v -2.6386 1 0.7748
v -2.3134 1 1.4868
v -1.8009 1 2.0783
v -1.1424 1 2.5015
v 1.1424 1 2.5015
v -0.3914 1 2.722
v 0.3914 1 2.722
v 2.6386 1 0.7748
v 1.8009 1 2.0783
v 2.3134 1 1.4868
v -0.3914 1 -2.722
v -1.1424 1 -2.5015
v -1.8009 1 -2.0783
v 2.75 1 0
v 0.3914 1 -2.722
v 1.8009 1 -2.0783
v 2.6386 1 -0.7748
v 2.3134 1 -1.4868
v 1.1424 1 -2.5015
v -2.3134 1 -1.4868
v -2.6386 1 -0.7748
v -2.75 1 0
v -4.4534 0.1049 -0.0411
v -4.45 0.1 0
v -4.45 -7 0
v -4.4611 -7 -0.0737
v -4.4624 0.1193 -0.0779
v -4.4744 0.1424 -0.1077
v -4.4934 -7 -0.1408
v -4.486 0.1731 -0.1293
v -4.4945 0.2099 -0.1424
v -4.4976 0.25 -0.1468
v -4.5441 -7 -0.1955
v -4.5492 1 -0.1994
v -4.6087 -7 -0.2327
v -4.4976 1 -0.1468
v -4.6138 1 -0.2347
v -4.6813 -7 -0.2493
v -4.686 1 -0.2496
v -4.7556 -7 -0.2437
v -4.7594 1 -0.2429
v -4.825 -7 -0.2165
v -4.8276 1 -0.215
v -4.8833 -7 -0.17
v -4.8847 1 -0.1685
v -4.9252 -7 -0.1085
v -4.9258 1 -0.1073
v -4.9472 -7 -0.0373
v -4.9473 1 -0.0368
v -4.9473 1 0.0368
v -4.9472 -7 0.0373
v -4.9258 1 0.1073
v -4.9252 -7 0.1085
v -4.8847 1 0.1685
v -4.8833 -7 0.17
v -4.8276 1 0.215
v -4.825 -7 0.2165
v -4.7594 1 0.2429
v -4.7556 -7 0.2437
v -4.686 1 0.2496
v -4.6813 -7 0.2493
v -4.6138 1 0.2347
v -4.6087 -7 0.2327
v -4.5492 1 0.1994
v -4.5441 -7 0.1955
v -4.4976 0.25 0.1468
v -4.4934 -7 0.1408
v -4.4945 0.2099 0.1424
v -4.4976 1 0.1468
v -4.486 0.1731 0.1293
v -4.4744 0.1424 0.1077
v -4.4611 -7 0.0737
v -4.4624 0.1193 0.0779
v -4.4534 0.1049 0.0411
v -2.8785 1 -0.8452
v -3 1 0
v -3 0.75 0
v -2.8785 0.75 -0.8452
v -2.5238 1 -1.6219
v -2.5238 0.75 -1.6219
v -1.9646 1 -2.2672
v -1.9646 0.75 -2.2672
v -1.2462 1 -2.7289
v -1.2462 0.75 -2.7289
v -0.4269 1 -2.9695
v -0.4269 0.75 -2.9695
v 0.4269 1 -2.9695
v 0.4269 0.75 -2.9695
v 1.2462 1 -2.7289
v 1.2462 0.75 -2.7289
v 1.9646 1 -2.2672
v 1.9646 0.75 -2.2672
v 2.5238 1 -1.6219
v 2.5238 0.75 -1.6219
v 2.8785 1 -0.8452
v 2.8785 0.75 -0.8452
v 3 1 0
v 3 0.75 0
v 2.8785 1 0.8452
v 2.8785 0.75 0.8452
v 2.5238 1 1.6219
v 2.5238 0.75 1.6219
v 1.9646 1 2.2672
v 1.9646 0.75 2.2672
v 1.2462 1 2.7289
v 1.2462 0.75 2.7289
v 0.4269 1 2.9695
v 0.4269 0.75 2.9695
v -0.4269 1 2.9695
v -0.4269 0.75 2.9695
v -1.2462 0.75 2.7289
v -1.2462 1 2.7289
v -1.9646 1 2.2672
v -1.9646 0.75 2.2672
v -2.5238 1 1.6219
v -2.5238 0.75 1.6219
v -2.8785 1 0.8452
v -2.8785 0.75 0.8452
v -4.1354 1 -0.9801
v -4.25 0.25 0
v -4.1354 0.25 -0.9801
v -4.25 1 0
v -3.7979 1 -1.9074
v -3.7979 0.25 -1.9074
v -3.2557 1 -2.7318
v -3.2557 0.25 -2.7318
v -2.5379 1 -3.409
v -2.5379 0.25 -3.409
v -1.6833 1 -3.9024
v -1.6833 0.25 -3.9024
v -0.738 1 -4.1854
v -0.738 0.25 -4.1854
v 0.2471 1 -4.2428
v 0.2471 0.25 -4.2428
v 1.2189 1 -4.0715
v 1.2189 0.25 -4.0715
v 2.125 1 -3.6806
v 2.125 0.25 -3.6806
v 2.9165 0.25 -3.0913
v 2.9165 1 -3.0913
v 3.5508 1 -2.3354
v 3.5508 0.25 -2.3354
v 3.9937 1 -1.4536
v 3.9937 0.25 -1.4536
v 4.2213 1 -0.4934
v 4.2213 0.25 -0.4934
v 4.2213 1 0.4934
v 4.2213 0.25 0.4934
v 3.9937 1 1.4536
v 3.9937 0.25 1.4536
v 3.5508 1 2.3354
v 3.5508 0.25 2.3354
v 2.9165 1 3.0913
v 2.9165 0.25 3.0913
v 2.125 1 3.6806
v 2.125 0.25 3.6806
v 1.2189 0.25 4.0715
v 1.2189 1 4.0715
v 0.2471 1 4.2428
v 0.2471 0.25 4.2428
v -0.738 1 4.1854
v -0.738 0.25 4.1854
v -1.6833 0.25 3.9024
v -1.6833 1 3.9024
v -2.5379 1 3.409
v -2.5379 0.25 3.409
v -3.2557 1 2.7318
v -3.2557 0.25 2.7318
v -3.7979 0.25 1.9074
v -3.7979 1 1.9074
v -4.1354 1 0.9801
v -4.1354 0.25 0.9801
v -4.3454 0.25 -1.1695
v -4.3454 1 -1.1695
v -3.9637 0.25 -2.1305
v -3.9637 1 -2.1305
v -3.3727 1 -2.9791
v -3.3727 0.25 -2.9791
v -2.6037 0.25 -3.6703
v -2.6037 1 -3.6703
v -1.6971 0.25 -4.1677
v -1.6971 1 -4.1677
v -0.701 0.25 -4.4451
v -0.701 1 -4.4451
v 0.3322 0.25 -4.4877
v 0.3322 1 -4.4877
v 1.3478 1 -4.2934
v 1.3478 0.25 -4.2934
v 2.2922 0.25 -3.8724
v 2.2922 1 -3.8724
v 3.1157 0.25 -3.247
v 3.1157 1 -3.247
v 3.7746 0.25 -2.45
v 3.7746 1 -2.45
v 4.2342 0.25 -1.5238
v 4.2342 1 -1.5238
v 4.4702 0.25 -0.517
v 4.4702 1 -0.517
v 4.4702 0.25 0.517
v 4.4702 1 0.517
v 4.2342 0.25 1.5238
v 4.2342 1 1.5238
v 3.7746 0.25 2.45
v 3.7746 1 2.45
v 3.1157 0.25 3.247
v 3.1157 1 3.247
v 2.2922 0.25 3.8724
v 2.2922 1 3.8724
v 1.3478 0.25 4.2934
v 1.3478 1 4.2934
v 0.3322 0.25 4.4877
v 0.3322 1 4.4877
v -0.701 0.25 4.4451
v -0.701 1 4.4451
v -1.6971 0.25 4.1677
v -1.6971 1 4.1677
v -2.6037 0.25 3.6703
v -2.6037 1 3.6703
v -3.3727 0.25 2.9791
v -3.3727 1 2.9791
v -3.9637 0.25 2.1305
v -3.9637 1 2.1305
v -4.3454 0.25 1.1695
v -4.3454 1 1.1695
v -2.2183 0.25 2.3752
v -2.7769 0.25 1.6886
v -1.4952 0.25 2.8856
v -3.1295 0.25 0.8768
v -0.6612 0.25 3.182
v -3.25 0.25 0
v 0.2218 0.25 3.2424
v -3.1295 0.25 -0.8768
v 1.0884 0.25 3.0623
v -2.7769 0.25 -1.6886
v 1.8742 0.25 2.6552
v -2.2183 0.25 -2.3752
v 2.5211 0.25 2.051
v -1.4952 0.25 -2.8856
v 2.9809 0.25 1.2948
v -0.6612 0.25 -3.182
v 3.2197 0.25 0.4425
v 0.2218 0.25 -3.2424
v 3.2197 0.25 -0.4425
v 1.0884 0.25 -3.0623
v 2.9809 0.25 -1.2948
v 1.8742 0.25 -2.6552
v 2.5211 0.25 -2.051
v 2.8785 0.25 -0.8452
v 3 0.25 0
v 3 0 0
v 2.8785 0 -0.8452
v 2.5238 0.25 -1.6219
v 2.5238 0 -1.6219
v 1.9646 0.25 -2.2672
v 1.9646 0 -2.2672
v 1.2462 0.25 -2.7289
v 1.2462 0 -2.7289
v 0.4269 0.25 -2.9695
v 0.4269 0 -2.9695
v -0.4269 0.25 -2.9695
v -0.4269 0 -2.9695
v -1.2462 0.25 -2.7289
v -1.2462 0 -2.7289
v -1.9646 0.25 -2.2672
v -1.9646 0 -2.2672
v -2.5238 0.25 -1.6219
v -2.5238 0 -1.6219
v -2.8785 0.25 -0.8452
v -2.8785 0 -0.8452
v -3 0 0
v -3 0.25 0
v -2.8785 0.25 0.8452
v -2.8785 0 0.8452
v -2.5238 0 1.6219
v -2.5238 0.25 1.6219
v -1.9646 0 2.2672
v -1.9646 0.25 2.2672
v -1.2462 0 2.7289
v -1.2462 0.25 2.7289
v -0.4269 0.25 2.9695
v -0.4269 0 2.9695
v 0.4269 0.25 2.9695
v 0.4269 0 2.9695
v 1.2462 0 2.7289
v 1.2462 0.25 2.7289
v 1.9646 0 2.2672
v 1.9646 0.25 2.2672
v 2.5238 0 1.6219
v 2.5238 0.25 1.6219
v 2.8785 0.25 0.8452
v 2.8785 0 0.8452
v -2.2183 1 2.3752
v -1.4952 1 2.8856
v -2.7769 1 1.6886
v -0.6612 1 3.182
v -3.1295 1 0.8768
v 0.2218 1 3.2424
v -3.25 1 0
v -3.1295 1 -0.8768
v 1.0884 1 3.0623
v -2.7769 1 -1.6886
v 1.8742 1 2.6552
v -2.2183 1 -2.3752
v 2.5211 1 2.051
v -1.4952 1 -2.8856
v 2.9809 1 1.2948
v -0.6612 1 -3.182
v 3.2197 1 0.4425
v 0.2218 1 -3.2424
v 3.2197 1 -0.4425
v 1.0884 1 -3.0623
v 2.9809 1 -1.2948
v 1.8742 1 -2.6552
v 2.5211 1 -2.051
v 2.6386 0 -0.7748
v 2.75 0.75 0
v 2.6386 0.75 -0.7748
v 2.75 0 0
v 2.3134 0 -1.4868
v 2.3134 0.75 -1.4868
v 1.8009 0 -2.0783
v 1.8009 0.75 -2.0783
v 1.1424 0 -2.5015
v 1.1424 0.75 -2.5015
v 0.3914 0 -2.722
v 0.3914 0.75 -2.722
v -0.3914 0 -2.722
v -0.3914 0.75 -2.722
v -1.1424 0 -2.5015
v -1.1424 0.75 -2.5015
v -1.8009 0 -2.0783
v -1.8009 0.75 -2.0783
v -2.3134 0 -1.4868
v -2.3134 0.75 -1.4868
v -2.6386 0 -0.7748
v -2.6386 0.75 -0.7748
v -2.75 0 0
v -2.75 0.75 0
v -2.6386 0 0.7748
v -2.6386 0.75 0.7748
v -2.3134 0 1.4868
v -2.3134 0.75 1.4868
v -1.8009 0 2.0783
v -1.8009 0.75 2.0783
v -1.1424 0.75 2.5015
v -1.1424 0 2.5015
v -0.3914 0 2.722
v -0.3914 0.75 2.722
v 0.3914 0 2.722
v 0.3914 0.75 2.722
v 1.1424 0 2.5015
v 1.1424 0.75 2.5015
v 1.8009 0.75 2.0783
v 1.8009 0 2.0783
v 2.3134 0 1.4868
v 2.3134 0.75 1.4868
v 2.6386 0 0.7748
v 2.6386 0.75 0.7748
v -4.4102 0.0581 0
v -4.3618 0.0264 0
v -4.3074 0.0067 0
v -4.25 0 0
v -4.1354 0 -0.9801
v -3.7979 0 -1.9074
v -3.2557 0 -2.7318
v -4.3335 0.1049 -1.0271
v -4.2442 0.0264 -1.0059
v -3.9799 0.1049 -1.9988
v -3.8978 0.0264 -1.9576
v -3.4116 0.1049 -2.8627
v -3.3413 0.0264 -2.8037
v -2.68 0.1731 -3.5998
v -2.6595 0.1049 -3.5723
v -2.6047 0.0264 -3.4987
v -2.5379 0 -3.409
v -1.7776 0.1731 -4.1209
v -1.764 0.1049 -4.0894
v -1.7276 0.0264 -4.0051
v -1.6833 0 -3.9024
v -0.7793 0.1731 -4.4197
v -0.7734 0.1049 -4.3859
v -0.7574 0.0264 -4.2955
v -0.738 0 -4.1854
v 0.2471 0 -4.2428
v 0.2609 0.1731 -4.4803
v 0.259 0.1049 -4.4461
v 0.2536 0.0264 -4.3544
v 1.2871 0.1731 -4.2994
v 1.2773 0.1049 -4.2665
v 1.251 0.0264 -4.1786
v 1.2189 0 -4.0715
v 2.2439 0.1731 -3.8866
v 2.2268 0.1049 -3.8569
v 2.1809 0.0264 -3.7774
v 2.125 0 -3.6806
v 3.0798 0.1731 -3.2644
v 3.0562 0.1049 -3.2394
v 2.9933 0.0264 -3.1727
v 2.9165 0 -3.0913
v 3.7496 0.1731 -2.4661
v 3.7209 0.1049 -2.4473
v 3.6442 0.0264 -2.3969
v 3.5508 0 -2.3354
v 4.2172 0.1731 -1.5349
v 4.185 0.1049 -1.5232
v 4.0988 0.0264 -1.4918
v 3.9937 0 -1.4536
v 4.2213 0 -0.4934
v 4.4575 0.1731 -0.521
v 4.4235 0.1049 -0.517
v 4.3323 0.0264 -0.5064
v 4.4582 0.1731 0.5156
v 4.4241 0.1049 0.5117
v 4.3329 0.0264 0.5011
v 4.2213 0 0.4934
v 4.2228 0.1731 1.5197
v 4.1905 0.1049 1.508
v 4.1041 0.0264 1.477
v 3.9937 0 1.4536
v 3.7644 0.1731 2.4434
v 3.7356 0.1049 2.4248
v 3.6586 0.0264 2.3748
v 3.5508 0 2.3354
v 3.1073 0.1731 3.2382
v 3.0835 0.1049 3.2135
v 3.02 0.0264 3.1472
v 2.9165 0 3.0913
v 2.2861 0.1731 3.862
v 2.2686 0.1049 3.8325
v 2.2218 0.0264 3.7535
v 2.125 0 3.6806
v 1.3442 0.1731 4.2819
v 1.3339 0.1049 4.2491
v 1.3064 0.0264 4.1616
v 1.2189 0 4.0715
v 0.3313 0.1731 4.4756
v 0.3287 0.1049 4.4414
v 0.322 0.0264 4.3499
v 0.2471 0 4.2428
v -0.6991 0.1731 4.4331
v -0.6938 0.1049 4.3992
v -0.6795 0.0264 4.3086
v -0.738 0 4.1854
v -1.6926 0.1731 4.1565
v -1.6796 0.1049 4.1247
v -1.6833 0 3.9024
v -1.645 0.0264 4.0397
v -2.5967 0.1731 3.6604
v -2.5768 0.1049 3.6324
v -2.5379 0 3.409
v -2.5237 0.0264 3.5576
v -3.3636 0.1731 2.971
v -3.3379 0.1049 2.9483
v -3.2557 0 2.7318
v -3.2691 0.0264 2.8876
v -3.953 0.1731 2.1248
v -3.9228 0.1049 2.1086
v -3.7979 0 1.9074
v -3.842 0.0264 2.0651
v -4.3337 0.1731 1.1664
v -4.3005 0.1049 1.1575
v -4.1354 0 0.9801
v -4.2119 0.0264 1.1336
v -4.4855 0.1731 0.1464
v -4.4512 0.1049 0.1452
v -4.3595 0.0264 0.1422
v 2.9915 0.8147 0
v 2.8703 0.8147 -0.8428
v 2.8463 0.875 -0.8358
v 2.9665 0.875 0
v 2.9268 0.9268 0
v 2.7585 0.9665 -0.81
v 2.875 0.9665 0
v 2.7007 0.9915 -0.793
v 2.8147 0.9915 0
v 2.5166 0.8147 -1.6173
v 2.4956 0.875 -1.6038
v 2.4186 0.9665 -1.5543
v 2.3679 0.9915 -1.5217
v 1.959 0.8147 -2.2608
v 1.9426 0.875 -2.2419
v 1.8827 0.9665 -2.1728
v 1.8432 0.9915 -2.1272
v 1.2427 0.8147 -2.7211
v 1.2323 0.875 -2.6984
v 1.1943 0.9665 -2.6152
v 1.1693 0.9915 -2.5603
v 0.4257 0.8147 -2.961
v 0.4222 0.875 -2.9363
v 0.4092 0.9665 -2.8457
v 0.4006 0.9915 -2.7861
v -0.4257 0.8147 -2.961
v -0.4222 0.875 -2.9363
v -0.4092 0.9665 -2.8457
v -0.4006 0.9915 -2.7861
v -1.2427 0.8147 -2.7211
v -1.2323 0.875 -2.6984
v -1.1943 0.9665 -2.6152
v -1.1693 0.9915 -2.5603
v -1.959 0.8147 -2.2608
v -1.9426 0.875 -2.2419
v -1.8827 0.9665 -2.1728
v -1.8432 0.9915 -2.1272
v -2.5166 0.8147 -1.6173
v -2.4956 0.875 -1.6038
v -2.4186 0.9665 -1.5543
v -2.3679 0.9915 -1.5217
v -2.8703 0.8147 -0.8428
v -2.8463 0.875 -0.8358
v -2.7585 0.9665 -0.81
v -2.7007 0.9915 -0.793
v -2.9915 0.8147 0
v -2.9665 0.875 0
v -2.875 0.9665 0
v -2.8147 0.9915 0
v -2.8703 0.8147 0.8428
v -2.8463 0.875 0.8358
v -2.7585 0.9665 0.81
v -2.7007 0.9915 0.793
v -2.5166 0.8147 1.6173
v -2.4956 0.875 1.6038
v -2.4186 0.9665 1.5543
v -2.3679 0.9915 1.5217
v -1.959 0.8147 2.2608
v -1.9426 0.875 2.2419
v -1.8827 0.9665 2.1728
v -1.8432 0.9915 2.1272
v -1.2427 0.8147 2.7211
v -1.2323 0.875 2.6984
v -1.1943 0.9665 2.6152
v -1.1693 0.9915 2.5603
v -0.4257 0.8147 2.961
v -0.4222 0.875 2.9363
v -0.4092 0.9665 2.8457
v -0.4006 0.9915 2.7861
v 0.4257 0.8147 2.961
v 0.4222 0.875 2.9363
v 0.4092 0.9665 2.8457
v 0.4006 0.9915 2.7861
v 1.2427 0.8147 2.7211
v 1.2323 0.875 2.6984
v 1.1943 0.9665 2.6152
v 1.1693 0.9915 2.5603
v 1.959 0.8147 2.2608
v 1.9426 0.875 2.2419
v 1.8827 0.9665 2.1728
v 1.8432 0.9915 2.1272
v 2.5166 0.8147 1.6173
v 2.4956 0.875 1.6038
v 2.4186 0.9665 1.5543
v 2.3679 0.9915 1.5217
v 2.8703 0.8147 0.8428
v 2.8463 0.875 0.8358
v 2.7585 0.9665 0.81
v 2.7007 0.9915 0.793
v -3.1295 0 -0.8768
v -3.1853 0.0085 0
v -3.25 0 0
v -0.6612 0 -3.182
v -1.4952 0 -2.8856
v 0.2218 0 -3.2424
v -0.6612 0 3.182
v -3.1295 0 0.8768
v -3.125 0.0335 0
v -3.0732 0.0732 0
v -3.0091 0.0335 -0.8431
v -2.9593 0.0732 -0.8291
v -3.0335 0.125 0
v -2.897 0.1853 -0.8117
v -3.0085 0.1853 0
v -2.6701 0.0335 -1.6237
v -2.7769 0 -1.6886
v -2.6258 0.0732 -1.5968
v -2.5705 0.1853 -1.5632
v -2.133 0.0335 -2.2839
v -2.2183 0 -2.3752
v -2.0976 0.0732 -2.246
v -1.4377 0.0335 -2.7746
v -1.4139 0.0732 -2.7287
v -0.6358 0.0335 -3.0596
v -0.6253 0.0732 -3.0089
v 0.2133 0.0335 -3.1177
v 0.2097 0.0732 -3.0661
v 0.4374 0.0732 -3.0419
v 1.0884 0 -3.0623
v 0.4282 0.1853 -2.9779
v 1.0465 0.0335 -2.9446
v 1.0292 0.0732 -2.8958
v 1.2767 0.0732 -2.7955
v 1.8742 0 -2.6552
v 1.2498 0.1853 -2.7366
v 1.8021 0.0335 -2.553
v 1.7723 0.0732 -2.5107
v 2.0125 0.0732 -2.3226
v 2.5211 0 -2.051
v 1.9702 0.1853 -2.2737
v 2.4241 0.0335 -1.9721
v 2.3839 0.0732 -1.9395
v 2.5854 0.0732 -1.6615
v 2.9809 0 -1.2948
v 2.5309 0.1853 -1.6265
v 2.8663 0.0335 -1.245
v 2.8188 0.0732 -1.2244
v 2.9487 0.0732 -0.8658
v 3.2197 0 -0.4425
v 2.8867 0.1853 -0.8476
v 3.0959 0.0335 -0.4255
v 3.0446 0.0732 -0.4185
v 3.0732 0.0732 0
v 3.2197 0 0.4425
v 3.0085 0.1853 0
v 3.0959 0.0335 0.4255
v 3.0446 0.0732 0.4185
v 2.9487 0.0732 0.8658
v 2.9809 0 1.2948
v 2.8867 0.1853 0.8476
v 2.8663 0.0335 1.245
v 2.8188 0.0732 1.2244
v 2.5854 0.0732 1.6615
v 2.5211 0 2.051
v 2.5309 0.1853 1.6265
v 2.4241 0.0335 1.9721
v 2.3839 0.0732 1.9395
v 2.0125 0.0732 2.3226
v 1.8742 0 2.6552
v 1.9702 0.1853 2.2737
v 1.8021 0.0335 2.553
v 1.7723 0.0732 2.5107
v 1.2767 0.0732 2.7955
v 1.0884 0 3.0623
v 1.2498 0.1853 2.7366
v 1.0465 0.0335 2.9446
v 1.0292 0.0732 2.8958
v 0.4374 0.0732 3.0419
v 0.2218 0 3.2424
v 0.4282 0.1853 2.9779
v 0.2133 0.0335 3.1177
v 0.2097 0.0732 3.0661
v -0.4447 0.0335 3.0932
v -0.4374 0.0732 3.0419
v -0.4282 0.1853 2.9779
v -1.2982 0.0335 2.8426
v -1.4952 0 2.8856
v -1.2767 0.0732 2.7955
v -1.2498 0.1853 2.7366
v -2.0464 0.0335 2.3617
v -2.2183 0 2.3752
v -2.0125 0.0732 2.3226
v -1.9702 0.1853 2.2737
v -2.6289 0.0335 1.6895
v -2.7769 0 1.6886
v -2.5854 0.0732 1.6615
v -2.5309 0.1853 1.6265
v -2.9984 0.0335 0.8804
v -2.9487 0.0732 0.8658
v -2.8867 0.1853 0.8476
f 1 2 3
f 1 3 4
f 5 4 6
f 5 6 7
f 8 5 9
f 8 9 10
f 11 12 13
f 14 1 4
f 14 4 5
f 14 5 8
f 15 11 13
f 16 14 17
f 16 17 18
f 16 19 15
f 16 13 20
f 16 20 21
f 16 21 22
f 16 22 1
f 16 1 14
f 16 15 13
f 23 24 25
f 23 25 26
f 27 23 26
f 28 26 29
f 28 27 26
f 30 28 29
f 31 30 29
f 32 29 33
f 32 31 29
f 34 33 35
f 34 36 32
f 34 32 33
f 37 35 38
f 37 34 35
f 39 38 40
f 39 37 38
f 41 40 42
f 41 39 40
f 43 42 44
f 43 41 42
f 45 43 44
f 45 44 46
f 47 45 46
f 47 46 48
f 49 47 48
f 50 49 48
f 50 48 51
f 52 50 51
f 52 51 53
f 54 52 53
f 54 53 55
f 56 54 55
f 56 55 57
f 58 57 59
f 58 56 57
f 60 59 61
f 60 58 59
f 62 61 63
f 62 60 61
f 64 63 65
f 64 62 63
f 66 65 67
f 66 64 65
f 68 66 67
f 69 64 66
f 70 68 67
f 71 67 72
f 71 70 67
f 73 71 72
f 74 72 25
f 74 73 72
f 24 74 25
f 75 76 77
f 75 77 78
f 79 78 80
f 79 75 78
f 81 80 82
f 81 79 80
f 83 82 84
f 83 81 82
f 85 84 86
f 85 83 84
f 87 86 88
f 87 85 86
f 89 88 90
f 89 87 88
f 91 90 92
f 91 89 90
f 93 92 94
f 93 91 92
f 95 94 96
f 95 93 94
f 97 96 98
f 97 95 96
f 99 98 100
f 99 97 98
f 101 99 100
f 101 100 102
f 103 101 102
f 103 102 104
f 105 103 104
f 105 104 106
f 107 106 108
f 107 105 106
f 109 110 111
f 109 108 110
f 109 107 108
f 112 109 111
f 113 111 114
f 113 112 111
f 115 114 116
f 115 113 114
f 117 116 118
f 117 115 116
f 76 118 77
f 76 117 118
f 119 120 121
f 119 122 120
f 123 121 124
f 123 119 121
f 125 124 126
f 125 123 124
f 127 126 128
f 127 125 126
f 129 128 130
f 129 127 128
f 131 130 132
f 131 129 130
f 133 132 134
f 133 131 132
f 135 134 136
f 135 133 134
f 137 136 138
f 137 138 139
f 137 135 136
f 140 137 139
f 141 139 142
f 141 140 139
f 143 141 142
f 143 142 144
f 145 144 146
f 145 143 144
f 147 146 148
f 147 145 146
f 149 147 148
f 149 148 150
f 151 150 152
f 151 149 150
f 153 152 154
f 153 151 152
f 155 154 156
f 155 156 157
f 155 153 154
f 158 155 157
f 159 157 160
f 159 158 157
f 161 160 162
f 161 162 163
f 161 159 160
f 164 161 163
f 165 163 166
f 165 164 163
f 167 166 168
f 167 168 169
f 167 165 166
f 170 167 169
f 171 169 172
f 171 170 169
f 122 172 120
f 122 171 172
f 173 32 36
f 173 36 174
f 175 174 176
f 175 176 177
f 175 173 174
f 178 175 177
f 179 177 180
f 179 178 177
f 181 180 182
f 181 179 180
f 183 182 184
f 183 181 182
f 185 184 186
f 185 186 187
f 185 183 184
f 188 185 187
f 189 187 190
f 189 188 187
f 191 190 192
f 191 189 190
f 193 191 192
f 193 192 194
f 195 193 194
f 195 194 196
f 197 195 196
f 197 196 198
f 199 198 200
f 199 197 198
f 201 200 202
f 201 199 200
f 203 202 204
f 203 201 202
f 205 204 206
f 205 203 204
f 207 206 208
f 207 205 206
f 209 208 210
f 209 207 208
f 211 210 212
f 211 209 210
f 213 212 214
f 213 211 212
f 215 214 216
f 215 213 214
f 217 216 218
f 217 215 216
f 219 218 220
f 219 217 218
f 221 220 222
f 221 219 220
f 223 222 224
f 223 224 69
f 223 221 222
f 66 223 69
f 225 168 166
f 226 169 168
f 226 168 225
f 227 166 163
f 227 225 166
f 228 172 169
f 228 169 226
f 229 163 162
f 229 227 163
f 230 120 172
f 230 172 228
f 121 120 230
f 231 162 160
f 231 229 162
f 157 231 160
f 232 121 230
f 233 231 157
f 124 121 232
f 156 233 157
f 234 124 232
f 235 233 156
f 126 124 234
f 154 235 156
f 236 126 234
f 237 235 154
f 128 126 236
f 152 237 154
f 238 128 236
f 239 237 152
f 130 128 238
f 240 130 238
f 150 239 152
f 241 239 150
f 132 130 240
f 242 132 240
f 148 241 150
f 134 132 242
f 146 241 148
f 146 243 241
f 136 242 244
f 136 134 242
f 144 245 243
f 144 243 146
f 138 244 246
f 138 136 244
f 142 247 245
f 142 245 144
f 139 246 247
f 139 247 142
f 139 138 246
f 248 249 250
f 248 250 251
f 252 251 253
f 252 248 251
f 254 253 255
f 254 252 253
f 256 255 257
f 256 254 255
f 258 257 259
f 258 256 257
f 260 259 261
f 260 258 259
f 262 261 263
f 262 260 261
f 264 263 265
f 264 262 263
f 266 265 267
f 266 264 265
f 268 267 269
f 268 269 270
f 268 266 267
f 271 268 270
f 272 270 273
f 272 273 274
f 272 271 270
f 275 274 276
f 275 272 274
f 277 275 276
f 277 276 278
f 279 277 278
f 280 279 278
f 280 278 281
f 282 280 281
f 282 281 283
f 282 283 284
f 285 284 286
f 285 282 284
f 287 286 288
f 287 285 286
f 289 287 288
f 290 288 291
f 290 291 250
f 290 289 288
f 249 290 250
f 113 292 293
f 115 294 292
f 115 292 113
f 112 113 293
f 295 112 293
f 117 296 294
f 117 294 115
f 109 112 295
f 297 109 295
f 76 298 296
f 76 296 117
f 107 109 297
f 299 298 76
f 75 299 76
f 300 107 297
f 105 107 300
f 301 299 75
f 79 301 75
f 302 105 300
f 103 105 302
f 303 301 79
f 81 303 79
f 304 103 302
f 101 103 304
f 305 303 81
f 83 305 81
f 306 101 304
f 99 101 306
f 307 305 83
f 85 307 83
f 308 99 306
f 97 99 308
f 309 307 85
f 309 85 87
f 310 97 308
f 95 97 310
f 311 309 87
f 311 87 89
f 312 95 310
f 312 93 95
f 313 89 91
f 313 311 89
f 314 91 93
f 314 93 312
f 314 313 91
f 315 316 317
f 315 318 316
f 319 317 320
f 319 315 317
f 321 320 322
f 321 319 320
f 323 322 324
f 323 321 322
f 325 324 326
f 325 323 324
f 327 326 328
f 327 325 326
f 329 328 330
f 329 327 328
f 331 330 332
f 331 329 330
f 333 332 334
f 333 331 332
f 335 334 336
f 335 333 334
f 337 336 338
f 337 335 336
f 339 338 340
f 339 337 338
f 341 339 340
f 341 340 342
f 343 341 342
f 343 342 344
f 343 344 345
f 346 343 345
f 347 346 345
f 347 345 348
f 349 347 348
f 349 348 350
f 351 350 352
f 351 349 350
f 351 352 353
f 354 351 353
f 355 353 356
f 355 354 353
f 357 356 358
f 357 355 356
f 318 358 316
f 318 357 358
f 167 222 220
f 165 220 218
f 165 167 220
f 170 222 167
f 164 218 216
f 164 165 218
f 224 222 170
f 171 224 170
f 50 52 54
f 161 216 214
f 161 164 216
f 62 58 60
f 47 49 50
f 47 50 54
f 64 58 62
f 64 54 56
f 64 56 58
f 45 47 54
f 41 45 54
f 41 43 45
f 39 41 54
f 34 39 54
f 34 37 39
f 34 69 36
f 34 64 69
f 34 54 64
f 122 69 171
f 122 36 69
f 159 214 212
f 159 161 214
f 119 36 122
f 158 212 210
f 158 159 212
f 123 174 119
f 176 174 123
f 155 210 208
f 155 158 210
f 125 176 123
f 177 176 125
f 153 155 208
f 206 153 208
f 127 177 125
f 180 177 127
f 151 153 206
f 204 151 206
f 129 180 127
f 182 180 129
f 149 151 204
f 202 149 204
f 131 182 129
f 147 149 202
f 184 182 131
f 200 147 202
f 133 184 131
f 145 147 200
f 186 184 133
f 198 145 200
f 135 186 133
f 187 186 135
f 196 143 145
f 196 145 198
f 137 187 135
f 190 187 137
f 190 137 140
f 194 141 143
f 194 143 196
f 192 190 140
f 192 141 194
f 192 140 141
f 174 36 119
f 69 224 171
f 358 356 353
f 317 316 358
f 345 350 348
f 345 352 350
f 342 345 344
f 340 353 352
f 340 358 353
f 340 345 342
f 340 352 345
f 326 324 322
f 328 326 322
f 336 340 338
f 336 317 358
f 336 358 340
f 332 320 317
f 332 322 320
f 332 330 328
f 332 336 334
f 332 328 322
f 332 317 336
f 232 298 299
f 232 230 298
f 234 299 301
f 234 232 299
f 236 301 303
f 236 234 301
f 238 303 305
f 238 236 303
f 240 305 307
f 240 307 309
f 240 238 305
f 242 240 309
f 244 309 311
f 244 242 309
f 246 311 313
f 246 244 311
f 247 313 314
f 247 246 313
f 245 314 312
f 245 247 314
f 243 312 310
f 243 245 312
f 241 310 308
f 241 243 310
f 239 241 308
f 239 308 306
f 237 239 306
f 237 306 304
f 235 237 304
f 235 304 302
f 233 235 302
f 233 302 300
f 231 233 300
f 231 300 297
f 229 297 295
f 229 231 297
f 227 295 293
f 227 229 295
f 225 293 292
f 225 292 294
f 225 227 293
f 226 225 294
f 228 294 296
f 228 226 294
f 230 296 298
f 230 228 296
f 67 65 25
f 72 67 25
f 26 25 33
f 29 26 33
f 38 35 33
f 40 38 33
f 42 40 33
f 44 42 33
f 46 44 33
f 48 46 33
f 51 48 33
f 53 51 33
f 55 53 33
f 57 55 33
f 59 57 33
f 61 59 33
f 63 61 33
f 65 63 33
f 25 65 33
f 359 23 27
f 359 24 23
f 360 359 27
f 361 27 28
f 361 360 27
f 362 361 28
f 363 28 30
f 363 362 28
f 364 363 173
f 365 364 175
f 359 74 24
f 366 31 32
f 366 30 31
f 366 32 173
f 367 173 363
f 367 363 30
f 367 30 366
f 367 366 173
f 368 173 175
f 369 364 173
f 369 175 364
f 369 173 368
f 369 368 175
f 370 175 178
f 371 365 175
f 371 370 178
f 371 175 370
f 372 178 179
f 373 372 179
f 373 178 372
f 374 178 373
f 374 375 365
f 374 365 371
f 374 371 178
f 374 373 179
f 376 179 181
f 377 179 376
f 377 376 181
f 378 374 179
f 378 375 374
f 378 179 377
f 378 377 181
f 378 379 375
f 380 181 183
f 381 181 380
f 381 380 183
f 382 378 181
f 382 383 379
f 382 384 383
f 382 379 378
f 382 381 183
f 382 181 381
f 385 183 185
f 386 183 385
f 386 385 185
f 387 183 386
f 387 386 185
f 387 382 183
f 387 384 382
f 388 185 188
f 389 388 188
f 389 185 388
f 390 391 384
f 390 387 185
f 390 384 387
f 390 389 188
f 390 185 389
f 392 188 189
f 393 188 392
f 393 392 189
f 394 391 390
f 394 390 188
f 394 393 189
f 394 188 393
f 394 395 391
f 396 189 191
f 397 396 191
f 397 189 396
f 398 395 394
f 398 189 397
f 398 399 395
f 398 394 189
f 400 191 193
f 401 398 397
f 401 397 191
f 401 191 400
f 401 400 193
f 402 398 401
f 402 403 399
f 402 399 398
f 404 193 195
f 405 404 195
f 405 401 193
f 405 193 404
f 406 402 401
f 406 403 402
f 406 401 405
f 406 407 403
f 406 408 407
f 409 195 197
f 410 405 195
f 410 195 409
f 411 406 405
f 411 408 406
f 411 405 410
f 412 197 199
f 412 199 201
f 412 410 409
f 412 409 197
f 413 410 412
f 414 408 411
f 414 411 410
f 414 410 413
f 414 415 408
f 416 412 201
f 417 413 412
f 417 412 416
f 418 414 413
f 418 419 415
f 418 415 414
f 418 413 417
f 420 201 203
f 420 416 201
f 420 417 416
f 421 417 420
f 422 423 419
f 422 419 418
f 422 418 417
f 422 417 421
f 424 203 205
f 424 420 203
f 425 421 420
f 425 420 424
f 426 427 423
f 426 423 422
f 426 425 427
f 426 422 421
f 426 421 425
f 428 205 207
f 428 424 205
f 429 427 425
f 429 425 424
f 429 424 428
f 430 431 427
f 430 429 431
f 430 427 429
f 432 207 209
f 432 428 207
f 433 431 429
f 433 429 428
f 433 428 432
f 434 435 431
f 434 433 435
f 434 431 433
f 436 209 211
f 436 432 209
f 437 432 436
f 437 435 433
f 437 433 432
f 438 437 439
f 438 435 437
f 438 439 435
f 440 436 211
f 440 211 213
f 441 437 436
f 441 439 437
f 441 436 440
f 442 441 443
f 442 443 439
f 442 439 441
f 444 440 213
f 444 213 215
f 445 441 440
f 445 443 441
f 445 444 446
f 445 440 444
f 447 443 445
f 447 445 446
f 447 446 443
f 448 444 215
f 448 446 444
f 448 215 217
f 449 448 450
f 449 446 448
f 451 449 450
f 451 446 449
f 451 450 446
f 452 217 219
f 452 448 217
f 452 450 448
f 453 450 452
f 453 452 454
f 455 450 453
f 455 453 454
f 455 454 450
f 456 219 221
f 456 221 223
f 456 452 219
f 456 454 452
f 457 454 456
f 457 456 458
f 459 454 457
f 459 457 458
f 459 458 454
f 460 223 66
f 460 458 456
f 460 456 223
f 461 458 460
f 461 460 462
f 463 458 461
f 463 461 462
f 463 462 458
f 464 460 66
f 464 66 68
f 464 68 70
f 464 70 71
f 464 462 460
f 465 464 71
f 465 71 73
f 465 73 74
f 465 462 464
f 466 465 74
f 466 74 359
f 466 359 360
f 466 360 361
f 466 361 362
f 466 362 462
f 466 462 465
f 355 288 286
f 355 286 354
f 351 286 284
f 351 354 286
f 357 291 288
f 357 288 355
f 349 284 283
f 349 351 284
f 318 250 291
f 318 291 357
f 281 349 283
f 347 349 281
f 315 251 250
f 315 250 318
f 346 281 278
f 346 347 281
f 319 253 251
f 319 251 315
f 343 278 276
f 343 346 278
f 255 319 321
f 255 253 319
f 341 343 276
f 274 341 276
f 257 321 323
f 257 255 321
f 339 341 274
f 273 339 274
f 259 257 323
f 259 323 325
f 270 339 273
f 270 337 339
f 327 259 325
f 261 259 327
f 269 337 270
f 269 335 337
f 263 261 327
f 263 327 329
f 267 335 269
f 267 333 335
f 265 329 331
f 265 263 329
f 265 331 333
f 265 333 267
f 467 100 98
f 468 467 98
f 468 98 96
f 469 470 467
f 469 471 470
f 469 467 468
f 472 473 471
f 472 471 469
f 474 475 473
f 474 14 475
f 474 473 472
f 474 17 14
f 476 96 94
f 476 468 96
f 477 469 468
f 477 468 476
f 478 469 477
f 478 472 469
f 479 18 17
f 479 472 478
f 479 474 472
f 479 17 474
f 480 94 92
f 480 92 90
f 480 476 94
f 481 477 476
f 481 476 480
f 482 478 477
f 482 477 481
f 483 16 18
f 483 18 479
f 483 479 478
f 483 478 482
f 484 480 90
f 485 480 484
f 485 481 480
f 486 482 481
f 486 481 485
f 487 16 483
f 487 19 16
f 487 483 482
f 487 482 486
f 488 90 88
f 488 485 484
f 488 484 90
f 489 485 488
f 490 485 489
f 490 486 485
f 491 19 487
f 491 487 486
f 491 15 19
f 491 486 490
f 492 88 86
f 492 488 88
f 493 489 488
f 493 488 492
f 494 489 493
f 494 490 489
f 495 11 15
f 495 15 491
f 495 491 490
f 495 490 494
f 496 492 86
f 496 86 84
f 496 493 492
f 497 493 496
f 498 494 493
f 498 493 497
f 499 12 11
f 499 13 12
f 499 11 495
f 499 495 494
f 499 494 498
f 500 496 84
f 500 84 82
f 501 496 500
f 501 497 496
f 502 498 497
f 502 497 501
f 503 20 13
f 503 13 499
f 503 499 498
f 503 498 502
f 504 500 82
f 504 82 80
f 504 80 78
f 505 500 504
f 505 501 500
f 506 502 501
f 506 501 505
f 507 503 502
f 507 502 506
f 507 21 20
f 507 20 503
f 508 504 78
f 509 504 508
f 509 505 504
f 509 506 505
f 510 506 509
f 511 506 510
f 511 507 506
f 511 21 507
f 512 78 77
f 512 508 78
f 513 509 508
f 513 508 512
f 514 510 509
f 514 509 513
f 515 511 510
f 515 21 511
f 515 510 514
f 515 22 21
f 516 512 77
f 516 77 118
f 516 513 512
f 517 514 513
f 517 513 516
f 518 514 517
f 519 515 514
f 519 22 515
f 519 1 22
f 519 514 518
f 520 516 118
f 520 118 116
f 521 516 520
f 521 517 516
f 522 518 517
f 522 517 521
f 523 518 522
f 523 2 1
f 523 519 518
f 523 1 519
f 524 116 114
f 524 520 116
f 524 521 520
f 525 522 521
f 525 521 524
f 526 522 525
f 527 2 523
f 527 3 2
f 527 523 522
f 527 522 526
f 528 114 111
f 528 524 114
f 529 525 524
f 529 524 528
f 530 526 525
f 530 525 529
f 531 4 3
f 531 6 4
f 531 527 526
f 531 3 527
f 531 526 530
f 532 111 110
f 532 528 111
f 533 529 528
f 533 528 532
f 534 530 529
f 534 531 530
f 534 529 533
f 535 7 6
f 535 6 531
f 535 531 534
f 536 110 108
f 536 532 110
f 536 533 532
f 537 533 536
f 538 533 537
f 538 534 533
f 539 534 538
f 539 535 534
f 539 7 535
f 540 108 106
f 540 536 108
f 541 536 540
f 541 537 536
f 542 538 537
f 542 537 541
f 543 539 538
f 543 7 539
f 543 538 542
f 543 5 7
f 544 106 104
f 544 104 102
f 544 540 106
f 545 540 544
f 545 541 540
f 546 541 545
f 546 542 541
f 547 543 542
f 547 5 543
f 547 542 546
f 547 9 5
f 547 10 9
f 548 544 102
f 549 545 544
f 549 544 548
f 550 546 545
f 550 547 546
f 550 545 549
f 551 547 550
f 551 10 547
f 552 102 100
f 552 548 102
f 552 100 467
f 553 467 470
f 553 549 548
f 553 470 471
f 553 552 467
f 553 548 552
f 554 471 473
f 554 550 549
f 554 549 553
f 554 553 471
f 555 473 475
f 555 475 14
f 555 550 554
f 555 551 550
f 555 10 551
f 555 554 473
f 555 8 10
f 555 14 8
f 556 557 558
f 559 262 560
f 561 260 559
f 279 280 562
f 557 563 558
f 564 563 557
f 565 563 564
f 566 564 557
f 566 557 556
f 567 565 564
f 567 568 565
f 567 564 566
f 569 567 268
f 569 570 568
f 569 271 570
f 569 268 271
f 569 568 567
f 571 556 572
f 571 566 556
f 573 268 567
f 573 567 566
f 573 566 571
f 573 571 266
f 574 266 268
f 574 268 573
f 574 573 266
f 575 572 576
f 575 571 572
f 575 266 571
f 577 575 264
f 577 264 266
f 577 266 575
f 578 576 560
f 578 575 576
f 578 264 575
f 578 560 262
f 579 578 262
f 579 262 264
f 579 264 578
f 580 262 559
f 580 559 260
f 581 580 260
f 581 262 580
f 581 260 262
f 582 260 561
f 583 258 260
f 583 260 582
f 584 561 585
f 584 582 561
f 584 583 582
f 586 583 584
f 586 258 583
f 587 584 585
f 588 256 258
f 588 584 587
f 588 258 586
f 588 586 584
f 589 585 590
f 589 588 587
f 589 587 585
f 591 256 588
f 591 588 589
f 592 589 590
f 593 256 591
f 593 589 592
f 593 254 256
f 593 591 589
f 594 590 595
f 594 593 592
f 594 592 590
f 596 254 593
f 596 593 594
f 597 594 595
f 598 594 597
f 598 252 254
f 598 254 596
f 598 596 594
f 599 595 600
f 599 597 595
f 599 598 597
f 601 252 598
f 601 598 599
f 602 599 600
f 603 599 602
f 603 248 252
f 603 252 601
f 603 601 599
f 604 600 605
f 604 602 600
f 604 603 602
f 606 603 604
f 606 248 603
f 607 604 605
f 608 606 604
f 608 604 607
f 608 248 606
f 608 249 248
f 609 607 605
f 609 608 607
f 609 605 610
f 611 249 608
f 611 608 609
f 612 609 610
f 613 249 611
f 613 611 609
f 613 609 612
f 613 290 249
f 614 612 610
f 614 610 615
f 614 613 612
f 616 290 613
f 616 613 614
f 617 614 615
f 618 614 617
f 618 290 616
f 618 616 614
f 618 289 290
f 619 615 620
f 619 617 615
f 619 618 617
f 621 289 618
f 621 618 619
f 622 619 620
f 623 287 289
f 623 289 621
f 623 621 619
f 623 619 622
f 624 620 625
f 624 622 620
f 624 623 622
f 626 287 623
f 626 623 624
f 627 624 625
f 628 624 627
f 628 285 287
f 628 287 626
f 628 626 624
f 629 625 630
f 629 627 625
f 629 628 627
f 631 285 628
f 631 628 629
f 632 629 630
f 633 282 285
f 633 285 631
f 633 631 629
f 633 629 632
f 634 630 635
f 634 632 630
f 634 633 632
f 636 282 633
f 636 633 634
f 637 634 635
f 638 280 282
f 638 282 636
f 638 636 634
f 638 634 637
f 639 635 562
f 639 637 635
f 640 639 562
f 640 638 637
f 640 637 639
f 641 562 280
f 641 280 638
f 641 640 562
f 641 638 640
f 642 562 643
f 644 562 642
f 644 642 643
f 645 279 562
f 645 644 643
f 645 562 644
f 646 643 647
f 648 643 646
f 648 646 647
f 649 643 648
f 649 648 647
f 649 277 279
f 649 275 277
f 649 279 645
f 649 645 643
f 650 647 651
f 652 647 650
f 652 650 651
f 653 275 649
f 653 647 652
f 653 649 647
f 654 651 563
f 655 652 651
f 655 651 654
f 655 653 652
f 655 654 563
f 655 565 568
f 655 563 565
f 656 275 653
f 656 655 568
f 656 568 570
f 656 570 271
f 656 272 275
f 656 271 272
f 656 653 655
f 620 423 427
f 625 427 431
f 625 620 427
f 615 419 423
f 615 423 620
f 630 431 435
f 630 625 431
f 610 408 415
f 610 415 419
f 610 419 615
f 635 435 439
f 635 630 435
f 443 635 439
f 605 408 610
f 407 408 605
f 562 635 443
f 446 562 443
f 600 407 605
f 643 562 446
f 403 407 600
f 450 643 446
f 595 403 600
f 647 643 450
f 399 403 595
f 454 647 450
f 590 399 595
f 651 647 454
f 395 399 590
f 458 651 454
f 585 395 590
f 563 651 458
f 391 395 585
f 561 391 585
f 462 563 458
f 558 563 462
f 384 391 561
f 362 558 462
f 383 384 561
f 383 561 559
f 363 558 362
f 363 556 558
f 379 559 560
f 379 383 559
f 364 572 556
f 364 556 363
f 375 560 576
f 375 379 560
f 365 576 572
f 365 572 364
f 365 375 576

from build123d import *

# Parameters (mm, degrees)
SKETCH3_R      = 0.25
EXTRUDE1_DEPTH = 8


with BuildPart() as part:
    # Sketch3 → Extrude1 (new body)
    with BuildSketch(Plane(origin=(0, 1, 0), x_dir=(1, 0, 0), z_dir=(0, 1, 0))):
        with Locations((-4.7, 0)):
            Circle(SKETCH3_R)
    extrude(amount=-EXTRUDE1_DEPTH)



with BuildPart() as body_2:
    # Sketch2 → Revolve-Thin1 (revolve)
    with BuildSketch(Plane(origin=(0, 0, 0), x_dir=(-1, 0, 0), z_dir=(0, 0, 1))):
        with BuildLine():
            Line((-3, 0), (-3, -0.75))
            ThreePointArc((-3, -0.75), (-2.926776695, -0.926776695), (-2.75, -1))
            Line((-2.75, -1), (0, -1))
            Line((0, -1), (0, -0.75))
            Line((0, -0.75), (-2.75, -0.75))
            Line((-2.75, -0.75), (-2.75, 0))
            Line((-2.75, 0), (-3, 0))
        make_face()
    revolve(axis=Axis((0, -0.05, 0), (0, 1, 0)))


with BuildPart() as part_1:
    add(part.part)

    add(body_2.part)  # Revolve-Thin2 merges body 2
    # Sketch1 → Revolve-Thin2 (revolve)
    with BuildSketch(Plane.XY):
        with BuildLine():
            Line((-4.5, 1), (-4.5, 0.25))
            ThreePointArc((-4.5, 0.25), (-4.426776695, 0.073223305), (-4.25, 0))
            Line((-4.25, 0), (-3.25, 0))
            ThreePointArc((-3.25, 0), (-3.073223305, 0.073223305), (-3, 0.25))
            Line((-3, 0.25), (-3, 1))
            Line((-3, 1), (-3.25, 1))
            Line((-3.25, 1), (-3.25, 0.25))
            Line((-3.25, 0.25), (-4.25, 0.25))
            Line((-4.25, 0.25), (-4.25, 1))
            Line((-4.25, 1), (-4.5, 1))
        make_face()
    revolve(axis=Axis((0, 1.05, 0), (0, -1, 0)))


solid = part_1.part
